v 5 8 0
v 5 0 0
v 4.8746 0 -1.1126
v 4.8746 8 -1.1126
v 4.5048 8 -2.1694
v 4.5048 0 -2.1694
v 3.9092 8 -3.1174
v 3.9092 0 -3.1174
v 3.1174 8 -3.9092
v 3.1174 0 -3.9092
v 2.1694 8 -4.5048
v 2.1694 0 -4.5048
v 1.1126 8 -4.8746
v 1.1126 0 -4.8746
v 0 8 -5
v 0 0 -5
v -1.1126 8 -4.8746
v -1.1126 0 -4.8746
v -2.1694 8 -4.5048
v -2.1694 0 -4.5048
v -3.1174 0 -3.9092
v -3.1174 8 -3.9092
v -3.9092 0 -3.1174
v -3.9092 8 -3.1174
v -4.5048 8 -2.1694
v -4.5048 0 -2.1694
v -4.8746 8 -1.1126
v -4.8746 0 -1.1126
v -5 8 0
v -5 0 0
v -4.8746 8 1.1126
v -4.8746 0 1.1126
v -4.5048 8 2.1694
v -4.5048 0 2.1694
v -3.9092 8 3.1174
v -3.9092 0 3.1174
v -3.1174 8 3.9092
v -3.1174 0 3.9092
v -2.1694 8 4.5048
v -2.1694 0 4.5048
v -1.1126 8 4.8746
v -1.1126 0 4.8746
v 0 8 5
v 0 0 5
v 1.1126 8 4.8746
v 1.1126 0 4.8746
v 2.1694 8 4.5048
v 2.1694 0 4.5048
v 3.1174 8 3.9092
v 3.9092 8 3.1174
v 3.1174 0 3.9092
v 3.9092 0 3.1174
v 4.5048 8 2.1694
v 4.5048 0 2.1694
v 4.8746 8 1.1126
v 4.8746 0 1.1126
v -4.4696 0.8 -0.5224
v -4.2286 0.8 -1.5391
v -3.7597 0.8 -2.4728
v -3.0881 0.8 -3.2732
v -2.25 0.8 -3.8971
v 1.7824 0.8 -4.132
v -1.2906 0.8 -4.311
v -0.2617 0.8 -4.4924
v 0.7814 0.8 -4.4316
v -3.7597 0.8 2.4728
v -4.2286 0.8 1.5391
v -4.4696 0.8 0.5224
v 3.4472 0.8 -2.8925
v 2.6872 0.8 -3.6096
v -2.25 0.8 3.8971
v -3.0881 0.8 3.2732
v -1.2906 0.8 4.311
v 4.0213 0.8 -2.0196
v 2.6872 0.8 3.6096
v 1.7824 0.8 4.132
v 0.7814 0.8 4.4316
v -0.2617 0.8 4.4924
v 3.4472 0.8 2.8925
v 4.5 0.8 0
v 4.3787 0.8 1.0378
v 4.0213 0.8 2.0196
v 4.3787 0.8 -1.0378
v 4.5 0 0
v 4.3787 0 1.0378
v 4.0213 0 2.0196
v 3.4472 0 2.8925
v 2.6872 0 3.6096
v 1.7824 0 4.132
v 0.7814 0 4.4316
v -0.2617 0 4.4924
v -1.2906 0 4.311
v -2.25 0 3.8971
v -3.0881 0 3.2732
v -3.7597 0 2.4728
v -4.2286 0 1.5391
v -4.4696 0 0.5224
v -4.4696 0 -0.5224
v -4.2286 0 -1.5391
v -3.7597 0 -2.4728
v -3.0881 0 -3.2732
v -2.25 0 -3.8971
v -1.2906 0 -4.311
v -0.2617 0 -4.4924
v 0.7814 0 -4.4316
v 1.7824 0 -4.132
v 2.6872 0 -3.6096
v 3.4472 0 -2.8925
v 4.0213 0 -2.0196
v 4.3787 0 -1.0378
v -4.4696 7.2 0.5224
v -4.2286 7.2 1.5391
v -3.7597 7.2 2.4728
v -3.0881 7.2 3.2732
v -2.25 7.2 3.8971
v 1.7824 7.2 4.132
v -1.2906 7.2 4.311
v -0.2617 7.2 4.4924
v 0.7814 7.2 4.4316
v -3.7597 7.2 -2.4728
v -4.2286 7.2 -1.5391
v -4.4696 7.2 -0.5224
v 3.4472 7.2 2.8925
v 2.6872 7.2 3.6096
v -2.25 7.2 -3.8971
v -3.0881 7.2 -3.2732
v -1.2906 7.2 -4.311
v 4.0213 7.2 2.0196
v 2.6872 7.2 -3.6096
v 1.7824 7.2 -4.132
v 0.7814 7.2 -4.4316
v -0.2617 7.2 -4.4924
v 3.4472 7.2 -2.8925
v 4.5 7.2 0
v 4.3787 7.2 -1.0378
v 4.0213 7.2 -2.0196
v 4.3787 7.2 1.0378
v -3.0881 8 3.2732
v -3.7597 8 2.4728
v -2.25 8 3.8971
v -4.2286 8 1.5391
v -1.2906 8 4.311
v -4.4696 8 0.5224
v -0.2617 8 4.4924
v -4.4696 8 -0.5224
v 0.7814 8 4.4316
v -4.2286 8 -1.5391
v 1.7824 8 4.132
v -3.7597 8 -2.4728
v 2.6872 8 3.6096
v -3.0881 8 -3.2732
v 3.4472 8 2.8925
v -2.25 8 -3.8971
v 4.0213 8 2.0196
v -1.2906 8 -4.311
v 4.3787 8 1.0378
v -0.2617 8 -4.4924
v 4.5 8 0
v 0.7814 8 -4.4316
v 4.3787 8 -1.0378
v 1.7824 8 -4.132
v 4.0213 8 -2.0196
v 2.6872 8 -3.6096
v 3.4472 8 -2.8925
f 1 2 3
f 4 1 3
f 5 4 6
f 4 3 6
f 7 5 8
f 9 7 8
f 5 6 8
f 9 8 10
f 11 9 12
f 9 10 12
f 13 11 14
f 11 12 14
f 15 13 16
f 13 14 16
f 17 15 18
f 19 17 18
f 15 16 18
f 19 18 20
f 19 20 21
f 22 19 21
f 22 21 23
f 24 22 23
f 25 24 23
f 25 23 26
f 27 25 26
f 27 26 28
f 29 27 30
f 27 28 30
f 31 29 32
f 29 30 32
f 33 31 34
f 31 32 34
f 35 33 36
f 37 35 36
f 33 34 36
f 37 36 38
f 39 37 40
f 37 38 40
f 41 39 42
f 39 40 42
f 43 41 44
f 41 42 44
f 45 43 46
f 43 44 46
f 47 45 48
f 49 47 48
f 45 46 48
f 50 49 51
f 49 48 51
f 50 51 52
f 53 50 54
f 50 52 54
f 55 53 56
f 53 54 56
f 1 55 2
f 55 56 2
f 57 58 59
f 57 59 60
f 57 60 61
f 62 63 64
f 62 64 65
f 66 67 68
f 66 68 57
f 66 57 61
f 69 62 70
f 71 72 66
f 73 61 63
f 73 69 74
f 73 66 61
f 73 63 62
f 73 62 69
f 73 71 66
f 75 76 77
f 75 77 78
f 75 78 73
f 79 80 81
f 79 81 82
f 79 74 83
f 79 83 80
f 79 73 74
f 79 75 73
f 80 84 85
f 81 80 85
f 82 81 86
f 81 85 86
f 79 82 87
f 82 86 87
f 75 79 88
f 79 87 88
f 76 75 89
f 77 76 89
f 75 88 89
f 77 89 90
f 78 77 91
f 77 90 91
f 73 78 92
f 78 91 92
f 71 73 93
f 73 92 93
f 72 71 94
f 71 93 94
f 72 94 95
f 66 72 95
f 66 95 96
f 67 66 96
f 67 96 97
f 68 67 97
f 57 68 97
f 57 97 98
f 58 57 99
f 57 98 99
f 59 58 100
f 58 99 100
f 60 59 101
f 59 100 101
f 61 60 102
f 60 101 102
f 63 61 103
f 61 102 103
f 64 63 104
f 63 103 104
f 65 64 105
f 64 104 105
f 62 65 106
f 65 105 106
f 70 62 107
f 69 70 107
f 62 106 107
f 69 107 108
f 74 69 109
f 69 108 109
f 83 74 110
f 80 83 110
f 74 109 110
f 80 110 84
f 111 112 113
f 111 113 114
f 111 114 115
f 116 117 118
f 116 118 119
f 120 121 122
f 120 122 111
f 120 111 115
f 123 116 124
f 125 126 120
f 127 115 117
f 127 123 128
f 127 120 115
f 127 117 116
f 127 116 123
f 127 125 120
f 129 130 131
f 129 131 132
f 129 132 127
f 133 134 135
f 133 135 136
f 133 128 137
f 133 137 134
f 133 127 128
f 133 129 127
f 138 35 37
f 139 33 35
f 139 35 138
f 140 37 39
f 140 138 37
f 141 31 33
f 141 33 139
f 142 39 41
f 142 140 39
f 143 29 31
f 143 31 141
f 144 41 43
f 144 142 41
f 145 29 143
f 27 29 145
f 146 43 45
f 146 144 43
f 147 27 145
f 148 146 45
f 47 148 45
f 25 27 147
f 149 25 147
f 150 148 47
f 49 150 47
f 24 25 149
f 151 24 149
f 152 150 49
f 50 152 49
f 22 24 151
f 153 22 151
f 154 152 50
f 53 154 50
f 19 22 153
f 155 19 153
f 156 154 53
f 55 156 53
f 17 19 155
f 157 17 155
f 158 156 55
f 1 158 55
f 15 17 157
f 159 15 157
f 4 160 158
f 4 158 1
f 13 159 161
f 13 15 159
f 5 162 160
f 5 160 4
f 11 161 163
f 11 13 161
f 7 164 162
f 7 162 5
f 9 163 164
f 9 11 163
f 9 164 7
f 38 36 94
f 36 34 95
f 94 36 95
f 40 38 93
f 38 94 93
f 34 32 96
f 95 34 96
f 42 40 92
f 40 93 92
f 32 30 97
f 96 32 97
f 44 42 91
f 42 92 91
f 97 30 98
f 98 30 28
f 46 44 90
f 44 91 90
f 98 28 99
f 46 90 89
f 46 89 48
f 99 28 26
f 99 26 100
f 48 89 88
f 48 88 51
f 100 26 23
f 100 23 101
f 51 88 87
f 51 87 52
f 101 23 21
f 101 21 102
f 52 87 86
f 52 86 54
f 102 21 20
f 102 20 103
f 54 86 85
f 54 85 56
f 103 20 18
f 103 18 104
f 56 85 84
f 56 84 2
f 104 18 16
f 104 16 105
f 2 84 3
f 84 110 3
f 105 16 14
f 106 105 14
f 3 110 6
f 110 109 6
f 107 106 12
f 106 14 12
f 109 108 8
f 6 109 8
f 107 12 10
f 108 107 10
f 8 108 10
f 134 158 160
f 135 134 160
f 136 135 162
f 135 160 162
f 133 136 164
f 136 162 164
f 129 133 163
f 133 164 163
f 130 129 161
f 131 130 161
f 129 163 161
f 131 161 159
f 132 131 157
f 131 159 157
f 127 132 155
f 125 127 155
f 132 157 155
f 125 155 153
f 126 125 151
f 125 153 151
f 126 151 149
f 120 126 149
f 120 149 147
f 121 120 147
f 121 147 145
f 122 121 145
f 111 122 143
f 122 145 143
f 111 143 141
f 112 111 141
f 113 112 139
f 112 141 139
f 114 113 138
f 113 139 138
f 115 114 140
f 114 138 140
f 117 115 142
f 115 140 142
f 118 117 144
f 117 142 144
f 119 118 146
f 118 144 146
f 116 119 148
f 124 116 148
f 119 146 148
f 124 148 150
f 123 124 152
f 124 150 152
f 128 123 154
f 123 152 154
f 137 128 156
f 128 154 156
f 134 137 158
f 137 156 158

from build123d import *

# Parameters (mm, degrees)
SCHIZZO1_R                   = 5
ESTRUSIONE_ESTRUSIONE1_DEPTH = 8
SCHIZZO2_R                   = 4.5
TAGLIO_ESTRUSIONE1_DEPTH     = 0.8
SCHIZZO3_R                   = 4.5
TAGLIO_ESTRUSIONE2_DEPTH     = 0.8


with BuildPart() as part:
    # Schizzo1 → Estrusione-Estrusione1 (new body)
    with BuildSketch(Plane(origin=(0, 0, 0), x_dir=(1, 0, 0), z_dir=(0, 1, 0))):
        Circle(SCHIZZO1_R)
    extrude(amount=ESTRUSIONE_ESTRUSIONE1_DEPTH)

    # Schizzo2 → Taglio-Estrusione1 (cut)
    with BuildSketch(Plane(origin=(0, 8, 0), x_dir=(1, 0, 0), z_dir=(0, 1, 0))):
        Circle(SCHIZZO2_R)
    extrude(amount=-TAGLIO_ESTRUSIONE1_DEPTH, mode=Mode.SUBTRACT)

    # Schizzo3 → Taglio-Estrusione2 (cut)
    with BuildSketch(Plane.XZ):
        Circle(SCHIZZO3_R)
    extrude(amount=-TAGLIO_ESTRUSIONE2_DEPTH, mode=Mode.SUBTRACT)


solid = part.part
